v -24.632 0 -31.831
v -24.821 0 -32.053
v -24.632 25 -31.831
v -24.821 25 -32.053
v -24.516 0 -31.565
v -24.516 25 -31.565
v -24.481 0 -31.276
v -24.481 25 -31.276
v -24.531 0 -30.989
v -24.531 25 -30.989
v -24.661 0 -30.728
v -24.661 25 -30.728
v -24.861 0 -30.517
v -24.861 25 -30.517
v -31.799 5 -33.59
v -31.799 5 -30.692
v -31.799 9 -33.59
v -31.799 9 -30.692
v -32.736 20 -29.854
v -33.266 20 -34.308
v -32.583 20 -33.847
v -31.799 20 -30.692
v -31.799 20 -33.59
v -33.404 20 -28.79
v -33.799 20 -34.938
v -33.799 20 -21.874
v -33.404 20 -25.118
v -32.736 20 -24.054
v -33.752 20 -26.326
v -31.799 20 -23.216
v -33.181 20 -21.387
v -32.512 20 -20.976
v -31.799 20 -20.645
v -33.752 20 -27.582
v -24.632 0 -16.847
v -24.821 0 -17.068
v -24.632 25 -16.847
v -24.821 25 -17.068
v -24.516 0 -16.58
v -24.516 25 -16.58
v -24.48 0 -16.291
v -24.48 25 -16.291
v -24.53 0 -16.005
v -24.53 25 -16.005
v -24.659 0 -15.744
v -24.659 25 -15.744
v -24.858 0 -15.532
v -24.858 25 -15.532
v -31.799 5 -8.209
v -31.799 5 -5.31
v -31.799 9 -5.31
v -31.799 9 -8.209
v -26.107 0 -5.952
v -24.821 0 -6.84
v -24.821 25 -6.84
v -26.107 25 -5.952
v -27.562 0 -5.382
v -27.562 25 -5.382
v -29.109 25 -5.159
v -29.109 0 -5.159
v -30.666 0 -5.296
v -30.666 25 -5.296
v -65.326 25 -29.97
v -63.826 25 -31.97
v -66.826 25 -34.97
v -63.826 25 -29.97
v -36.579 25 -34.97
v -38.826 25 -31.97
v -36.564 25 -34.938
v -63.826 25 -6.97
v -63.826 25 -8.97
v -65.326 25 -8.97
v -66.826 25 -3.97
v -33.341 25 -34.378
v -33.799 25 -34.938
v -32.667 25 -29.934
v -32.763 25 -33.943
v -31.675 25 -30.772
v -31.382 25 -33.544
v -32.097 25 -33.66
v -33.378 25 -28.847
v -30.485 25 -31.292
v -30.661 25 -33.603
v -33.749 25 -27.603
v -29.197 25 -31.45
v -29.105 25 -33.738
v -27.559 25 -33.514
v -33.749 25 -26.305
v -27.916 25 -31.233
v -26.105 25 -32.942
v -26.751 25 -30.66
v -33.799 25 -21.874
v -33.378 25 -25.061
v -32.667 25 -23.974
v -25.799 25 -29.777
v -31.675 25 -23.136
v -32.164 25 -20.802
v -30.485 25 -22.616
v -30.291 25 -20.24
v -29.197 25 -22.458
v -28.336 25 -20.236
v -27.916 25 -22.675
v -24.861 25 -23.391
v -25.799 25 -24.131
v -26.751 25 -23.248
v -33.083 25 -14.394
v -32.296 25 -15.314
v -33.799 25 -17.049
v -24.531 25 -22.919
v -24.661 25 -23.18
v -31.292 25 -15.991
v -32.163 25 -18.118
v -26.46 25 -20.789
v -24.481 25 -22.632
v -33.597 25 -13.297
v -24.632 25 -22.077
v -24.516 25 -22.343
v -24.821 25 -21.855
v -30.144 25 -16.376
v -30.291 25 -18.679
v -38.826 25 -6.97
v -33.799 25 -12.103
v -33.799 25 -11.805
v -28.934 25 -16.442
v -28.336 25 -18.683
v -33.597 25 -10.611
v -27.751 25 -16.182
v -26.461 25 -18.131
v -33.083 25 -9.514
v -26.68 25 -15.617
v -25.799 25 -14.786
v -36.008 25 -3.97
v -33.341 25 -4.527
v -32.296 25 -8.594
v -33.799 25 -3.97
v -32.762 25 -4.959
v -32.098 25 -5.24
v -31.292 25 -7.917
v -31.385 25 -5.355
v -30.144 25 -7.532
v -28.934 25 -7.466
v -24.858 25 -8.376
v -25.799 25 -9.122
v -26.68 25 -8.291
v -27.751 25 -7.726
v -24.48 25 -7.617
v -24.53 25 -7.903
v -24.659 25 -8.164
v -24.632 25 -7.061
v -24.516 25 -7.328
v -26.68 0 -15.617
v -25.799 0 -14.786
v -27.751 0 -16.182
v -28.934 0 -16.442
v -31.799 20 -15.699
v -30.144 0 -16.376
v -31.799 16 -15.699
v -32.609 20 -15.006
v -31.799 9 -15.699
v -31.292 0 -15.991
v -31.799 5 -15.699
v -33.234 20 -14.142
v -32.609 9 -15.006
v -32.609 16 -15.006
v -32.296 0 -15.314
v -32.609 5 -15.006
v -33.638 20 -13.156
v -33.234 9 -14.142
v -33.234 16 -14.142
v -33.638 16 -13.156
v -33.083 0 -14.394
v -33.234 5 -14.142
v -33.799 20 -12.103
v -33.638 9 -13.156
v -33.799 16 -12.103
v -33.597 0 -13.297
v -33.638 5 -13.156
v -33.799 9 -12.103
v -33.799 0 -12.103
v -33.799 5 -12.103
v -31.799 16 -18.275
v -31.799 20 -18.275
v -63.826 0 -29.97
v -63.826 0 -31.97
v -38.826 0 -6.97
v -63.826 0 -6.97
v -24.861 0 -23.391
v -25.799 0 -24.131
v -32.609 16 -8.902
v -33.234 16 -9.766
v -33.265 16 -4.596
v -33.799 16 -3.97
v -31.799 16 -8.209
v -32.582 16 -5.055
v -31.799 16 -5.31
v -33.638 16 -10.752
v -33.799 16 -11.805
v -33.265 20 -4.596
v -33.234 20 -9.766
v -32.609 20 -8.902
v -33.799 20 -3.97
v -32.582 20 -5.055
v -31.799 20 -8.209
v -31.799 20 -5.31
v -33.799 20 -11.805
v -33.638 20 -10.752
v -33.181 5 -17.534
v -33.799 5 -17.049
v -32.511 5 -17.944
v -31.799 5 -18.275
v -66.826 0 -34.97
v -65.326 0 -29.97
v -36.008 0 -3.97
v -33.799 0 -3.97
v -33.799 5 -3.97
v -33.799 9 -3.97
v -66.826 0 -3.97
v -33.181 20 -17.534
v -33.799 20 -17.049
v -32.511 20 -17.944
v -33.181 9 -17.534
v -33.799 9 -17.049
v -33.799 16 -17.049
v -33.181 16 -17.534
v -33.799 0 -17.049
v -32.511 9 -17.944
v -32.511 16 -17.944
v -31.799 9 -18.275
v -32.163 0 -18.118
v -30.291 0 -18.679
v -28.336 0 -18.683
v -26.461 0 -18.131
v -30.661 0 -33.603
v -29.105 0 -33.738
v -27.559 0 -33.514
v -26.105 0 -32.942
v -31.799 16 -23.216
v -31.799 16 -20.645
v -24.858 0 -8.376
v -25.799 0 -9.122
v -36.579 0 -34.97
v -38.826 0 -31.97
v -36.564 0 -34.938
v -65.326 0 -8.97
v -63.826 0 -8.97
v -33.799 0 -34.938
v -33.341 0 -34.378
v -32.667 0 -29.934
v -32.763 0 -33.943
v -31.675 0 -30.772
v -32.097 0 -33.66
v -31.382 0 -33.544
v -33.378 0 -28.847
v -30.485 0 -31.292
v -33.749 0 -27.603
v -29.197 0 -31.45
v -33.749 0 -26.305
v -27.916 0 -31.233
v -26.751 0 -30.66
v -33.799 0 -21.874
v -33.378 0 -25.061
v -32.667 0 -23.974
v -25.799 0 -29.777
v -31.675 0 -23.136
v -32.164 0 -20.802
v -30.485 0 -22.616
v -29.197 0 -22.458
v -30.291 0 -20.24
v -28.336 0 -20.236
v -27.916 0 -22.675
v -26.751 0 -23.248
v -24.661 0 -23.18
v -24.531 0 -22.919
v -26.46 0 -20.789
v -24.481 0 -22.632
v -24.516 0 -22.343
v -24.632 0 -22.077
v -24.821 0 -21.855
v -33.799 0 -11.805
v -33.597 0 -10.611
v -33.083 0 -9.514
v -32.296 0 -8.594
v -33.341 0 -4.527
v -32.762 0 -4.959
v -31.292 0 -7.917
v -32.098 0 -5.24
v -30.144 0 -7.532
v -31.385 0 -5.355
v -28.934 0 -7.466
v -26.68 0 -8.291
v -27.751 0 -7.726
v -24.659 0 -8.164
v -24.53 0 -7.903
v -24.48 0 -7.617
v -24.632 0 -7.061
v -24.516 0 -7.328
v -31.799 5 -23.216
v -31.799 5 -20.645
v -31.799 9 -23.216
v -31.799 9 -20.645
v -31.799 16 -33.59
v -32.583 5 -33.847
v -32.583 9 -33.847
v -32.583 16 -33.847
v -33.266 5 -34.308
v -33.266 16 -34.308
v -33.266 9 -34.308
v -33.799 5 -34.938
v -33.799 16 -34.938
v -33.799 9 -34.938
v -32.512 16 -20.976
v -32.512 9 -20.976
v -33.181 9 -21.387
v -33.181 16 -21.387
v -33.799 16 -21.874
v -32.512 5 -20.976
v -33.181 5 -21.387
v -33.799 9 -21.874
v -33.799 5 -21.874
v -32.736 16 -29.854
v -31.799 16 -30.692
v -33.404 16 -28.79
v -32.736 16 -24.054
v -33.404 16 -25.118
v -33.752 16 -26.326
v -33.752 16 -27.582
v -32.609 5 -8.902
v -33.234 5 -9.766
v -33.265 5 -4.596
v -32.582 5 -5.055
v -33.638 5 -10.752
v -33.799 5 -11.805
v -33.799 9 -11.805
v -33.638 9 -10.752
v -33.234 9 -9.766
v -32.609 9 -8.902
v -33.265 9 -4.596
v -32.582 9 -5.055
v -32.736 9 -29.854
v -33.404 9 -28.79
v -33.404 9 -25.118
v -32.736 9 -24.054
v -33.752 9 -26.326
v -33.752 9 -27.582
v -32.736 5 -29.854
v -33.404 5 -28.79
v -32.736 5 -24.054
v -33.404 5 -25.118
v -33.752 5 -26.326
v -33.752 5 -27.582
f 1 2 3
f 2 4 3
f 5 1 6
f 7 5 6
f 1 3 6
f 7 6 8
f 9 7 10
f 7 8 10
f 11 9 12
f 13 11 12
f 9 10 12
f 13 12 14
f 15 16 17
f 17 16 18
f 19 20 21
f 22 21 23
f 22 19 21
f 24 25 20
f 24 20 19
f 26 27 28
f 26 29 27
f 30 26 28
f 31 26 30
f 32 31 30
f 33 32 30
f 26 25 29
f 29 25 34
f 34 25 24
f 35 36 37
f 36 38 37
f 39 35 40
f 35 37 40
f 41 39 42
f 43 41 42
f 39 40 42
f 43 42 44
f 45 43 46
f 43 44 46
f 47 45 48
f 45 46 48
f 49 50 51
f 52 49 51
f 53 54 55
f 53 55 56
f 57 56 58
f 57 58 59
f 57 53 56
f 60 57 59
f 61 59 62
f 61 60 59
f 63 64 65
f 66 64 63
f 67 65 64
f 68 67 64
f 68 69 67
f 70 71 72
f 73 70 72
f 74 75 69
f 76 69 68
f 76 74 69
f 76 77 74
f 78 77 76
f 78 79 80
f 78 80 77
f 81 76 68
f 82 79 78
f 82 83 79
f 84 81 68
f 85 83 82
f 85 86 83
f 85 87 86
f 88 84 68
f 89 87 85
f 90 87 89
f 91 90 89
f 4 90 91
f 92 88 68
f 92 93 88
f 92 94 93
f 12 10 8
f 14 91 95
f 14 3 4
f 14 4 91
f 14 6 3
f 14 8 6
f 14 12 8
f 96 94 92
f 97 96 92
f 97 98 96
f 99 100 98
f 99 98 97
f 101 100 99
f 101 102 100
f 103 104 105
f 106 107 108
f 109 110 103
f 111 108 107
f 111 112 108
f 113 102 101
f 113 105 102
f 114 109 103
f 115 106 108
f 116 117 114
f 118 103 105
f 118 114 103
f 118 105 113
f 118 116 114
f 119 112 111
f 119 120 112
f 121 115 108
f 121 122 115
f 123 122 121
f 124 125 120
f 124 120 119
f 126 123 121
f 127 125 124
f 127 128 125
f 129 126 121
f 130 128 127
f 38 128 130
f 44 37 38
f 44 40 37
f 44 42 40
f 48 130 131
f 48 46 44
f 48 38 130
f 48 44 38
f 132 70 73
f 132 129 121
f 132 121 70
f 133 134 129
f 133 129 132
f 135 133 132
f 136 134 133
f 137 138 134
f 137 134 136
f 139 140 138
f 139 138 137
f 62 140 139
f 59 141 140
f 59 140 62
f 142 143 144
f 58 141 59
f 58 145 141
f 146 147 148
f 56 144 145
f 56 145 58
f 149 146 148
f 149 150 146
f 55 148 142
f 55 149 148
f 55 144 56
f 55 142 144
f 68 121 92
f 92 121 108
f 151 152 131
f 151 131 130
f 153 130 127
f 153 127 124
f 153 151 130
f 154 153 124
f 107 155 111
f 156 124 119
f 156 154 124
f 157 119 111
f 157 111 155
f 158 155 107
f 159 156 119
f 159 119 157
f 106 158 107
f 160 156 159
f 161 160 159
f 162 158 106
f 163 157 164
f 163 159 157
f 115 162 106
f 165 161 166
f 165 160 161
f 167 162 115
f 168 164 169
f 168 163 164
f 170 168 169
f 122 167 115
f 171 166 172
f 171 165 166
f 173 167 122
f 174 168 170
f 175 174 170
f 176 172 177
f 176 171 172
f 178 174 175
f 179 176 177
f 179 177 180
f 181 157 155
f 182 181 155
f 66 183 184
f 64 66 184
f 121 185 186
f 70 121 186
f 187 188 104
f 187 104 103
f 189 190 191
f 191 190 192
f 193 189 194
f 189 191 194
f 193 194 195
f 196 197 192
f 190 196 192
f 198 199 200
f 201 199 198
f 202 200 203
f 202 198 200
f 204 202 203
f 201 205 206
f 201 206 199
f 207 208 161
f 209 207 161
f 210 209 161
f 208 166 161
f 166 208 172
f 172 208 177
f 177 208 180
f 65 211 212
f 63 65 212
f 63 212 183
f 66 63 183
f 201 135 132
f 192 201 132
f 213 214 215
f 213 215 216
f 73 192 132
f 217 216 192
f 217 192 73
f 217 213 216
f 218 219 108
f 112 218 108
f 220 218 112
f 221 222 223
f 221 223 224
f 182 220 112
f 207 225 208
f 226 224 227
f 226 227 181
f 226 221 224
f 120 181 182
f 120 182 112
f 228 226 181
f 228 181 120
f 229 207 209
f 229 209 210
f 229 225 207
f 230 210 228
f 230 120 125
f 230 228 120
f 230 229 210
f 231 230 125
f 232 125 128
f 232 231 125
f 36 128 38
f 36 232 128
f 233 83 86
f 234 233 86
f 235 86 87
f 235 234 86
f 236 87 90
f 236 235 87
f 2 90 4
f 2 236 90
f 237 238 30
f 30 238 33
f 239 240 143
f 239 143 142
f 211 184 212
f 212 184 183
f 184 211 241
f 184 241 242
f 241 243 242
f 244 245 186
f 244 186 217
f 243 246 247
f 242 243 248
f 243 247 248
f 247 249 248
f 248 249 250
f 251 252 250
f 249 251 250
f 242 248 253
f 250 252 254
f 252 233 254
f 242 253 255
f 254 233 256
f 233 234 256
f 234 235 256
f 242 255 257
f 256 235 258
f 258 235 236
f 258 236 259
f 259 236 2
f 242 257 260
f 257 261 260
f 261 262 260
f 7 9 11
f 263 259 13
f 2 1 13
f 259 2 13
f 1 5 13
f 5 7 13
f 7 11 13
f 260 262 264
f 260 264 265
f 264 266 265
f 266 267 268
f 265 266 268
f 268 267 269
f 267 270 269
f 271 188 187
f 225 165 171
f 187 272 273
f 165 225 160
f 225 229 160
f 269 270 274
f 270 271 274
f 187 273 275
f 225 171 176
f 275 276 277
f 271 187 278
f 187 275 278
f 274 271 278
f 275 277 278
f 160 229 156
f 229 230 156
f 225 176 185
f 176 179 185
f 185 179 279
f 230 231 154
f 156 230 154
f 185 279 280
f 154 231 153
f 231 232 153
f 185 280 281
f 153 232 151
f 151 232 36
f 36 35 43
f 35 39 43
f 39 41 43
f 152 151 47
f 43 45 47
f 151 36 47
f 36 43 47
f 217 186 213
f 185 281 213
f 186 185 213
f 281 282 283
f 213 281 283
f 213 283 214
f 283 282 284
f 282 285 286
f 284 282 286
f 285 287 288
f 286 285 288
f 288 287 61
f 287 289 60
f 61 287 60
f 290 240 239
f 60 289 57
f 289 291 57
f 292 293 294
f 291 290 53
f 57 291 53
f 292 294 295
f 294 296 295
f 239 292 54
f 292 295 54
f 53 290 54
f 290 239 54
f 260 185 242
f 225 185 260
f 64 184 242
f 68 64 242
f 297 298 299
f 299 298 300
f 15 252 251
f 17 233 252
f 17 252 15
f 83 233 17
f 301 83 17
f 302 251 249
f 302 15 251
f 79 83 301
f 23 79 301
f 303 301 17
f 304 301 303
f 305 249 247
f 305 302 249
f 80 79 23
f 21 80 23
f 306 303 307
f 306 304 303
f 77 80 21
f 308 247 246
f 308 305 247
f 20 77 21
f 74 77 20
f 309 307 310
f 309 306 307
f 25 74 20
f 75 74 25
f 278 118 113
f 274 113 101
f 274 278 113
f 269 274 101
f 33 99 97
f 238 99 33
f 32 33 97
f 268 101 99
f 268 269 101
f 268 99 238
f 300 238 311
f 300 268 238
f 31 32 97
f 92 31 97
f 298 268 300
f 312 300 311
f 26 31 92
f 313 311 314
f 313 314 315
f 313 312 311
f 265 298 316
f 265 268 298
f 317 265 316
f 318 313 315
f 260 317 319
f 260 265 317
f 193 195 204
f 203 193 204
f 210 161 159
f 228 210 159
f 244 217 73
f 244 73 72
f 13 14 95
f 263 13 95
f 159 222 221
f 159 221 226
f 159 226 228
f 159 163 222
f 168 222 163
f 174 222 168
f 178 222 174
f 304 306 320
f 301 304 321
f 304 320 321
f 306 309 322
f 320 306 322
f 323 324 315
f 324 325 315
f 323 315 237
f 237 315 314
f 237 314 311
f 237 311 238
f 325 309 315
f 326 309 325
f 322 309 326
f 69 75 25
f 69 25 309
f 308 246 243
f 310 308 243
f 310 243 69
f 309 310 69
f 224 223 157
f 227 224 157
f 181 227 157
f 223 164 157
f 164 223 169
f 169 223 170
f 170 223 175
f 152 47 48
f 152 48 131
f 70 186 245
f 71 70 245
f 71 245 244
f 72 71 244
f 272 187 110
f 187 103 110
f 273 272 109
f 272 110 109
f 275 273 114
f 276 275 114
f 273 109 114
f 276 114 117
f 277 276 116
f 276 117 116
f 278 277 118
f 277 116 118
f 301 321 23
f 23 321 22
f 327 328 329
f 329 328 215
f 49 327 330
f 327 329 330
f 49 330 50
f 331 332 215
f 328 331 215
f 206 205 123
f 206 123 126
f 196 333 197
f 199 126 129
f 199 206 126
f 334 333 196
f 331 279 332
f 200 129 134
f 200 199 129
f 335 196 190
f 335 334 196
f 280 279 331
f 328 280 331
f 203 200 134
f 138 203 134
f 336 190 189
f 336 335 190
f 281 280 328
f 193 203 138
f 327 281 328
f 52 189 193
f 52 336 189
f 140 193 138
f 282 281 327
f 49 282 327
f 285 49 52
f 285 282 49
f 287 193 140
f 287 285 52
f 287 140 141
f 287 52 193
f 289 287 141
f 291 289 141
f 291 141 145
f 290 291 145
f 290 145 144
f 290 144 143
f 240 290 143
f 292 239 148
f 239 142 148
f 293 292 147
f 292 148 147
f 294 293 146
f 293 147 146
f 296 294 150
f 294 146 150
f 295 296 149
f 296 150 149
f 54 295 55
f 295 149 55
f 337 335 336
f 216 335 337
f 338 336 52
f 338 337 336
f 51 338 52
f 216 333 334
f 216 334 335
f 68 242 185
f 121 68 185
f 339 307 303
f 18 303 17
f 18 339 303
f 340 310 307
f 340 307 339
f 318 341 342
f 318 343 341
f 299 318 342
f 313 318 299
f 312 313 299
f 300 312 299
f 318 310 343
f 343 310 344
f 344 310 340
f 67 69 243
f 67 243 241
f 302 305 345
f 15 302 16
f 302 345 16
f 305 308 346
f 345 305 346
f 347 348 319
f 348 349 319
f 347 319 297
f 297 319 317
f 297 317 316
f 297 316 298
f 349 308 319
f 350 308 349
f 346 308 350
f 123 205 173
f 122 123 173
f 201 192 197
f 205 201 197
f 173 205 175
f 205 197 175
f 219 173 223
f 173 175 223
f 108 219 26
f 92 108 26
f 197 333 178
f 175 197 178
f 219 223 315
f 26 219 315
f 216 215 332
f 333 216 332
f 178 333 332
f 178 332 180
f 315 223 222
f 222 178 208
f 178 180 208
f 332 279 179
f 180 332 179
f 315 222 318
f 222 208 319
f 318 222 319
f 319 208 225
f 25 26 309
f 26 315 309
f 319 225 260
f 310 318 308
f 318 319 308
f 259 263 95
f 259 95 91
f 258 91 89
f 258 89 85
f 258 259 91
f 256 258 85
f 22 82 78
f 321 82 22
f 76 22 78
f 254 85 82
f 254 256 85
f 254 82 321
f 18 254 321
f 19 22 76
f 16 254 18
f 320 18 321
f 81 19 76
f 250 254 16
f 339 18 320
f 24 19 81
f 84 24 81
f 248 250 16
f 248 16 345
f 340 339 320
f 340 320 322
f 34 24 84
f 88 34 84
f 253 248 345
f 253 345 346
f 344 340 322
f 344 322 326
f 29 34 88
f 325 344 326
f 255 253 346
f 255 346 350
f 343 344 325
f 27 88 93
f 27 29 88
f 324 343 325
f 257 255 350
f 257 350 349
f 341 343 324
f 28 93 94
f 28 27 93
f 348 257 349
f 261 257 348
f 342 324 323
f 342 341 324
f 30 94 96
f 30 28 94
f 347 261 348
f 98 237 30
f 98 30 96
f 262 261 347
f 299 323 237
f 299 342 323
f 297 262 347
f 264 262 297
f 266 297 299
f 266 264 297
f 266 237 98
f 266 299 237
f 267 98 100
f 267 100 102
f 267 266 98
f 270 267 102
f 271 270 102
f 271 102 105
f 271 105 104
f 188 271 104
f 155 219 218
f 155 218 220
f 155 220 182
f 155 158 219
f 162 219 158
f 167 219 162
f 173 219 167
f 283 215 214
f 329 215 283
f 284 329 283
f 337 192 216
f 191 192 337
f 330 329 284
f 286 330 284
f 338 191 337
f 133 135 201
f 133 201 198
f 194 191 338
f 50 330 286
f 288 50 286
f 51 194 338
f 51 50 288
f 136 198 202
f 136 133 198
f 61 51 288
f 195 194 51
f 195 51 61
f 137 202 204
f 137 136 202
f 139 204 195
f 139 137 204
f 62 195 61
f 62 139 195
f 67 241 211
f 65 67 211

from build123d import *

# Parameters (mm, degrees)
EXTRUDE_1_DEPTH      = 25
CUT_EXTRUDE_4_DEPTH  = 80.457942189
SKETCH_7_W           = 16.60831278
SKETCH_7_H           = 38.473598513
CUT_EXTRUDE_14_DEPTH = 80.457942189
SKETCH_8_W           = 5
SKETCH_8_H           = 30.968526609
EXTRUDE_2_DEPTH      = 25
EXTRUDE_3_DEPTH      = 25
FILLET_2_R           = 3
FILLET_4_R           = 1
SKETCH_10_W          = 2
SKETCH_10_H          = 4
CUT_EXTRUDE_15_DEPTH = 78.792556685


with BuildPart() as part:
    # Эскиз1 → Бобышка-Вытянуть1 (new body)
    with BuildSketch(Plane(origin=(0, 0, 0), x_dir=(1, 0, 0), z_dir=(0, 1, 0))):
        Polygon((-66.825757576, 34.969739794), (-66.825757576, 29.969739794), (-63.825757576, 29.969739794), (-63.825757576, 31.969739794), (-38.825757576, 31.969739794), (-38.825757576, 6.969739794), (-63.825757576, 6.969739794), (-63.825757576, 8.969739794), (-66.825757576, 8.969739794), (-66.825757576, 3.969739794), (-22.123470102, 3.969739794), (-36.579007505, 34.969739794), align=None)
    extrude(amount=EXTRUDE_1_DEPTH)

    # Эскиз3 → Вырез-Вытянуть4 (cut, through all)
    with BuildSketch(Plane.XZ):
        Polygon((-66.825757576, -3.969739794), (-65.325757576, -8.969739794), (-66.825757576, -8.969739794), align=None)
        Polygon((-66.825757576, -29.969739794), (-66.825757576, -34.969739794), (-65.325757576, -29.969739794), align=None)
    extrude(amount=-CUT_EXTRUDE_4_DEPTH, mode=Mode.SUBTRACT)

    # Эскиз7 → Вырез-Вытянуть14 (cut, through all)
    with BuildSketch(Plane(origin=(0, 0, 0), x_dir=(-1, 0, 0), z_dir=(0, -1, 0))):
        with Locations((27.703474463, 20.539743139)):
            Rectangle(SKETCH_7_W, SKETCH_7_H)
    extrude(amount=-CUT_EXTRUDE_14_DEPTH, mode=Mode.SUBTRACT)

    # Эскиз8 → Бобышка-Вытянуть2 (add)
    with BuildSketch(Plane(origin=(0, 0, 0), x_dir=(-1, 0, 0), z_dir=(0, -1, 0))):
        with Locations((36.298943925, 19.454003098)):
            Rectangle(SKETCH_8_W, SKETCH_8_H)
    extrude(amount=-EXTRUDE_2_DEPTH)

    # Эскиз9 → Бобышка-Вытянуть3 (add)
    with BuildSketch(Plane.XZ):
        with BuildLine():
            Line((-25.798943925, -9.121669553), (-24.000865345, -7.695483003))
            ThreePointArc((-24.000865345, -7.695483003), (-36.096342696, -11.954003099), (-24.000865345, -16.212523195))
            Line((-24.000865345, -16.212523195), (-25.798943925, -14.786336644))
            ThreePointArc((-25.798943925, -14.786336644), (-33.80140029, -11.954003099), (-25.798943925, -9.121669553))
        make_face()
        with BuildLine():
            Line((-25.798943925, -24.130682885), (-24.000865345, -22.7126007))
            ThreePointArc((-24.000865345, -22.7126007), (-36.0856317, -26.954003099), (-24.000865345, -31.195405497))
            Line((-24.000865345, -31.195405497), (-25.798943925, -29.777323313))
            ThreePointArc((-25.798943925, -29.777323313), (-33.795735785, -26.954003099), (-25.798943925, -24.130682885))
        make_face()
    extrude(amount=-EXTRUDE_3_DEPTH)

    # Скругление2
    # the kernel refuses this fillet: 3 mm, written as the material it adds along each edge
    with BuildSketch(Plane(origin=(-33.798943925, 25, -6.859434417), x_dir=(0, 0, 1), z_dir=(0, -1, 0))) as fillet_2_piece_1:
        with BuildLine():
            CenterArc((4.502629254, -2.529514158), FILLET_2_R, 122.523458888, 69.079199353)
            Line((1.563931496, -3.132884263), (1.505157541, -3.144951665))
            ThreePointArc((1.505157541, -3.144951665), (0.933475042, -1.490808901), (-0.044969279, -0.039721077))
            Line((-0.044969279, -0.039721077), (0, 0.06))
            ThreePointArc((0, 0.06), (1.444847312, 0.06), (2.85743593, 0.050590283))
            Line((2.85743593, 0.050590283), (2.889694623, 0))
        make_face()
    extrude(amount=25)
    with BuildSketch(Plane(origin=(-33.798943925, 25, -32.034271886), x_dir=(0, 0, -1), z_dir=(0, -1, 0))) as fillet_2_piece_2:
        with BuildLine():
            CenterArc((4.507255062, 2.535656843), FILLET_2_R, 168.421178081, 69.274223823)
            Line((1.568306542, 3.137804332), (1.509527572, 3.149847282))
            ThreePointArc((1.509527572, 3.149847282), (0.936720457, 1.492647534), (-0.044913828, 0.039783766))
            Line((-0.044913828, 0.039783766), (0, -0.06))
            ThreePointArc((0, -0.06), (1.451997259, -0.06), (2.871929307, -0.050713137))
            Line((2.871929307, -0.050713137), (2.903994517, 0))
        make_face()
    extrude(amount=25)

    # Скругление4
    fillet_4_edges = [part.edges().sort_by_distance(p)[0] for p in [
        (-24.000865345, 12.5, -7.695483003),
        (-24.000865345, 12.5, -16.212523195),
        (-24.000865345, 12.5, -22.7126007),
        (-24.000865345, 12.5, -31.195405497),
    ]]
    fillet(fillet_4_edges, radius=FILLET_4_R)

    # Эскиз10 → Вырез-Вытянуть15 (cut, through all)
    with BuildSketch(Plane.XY.offset(-3.969739794)):
        with Locations((-32.798943925, 18)):
            Rectangle(SKETCH_10_W, SKETCH_10_H)
        with Locations((-32.798943925, 7)):
            Rectangle(SKETCH_10_W, SKETCH_10_H)
    extrude(amount=-CUT_EXTRUDE_15_DEPTH, mode=Mode.SUBTRACT)


solid = part.part
